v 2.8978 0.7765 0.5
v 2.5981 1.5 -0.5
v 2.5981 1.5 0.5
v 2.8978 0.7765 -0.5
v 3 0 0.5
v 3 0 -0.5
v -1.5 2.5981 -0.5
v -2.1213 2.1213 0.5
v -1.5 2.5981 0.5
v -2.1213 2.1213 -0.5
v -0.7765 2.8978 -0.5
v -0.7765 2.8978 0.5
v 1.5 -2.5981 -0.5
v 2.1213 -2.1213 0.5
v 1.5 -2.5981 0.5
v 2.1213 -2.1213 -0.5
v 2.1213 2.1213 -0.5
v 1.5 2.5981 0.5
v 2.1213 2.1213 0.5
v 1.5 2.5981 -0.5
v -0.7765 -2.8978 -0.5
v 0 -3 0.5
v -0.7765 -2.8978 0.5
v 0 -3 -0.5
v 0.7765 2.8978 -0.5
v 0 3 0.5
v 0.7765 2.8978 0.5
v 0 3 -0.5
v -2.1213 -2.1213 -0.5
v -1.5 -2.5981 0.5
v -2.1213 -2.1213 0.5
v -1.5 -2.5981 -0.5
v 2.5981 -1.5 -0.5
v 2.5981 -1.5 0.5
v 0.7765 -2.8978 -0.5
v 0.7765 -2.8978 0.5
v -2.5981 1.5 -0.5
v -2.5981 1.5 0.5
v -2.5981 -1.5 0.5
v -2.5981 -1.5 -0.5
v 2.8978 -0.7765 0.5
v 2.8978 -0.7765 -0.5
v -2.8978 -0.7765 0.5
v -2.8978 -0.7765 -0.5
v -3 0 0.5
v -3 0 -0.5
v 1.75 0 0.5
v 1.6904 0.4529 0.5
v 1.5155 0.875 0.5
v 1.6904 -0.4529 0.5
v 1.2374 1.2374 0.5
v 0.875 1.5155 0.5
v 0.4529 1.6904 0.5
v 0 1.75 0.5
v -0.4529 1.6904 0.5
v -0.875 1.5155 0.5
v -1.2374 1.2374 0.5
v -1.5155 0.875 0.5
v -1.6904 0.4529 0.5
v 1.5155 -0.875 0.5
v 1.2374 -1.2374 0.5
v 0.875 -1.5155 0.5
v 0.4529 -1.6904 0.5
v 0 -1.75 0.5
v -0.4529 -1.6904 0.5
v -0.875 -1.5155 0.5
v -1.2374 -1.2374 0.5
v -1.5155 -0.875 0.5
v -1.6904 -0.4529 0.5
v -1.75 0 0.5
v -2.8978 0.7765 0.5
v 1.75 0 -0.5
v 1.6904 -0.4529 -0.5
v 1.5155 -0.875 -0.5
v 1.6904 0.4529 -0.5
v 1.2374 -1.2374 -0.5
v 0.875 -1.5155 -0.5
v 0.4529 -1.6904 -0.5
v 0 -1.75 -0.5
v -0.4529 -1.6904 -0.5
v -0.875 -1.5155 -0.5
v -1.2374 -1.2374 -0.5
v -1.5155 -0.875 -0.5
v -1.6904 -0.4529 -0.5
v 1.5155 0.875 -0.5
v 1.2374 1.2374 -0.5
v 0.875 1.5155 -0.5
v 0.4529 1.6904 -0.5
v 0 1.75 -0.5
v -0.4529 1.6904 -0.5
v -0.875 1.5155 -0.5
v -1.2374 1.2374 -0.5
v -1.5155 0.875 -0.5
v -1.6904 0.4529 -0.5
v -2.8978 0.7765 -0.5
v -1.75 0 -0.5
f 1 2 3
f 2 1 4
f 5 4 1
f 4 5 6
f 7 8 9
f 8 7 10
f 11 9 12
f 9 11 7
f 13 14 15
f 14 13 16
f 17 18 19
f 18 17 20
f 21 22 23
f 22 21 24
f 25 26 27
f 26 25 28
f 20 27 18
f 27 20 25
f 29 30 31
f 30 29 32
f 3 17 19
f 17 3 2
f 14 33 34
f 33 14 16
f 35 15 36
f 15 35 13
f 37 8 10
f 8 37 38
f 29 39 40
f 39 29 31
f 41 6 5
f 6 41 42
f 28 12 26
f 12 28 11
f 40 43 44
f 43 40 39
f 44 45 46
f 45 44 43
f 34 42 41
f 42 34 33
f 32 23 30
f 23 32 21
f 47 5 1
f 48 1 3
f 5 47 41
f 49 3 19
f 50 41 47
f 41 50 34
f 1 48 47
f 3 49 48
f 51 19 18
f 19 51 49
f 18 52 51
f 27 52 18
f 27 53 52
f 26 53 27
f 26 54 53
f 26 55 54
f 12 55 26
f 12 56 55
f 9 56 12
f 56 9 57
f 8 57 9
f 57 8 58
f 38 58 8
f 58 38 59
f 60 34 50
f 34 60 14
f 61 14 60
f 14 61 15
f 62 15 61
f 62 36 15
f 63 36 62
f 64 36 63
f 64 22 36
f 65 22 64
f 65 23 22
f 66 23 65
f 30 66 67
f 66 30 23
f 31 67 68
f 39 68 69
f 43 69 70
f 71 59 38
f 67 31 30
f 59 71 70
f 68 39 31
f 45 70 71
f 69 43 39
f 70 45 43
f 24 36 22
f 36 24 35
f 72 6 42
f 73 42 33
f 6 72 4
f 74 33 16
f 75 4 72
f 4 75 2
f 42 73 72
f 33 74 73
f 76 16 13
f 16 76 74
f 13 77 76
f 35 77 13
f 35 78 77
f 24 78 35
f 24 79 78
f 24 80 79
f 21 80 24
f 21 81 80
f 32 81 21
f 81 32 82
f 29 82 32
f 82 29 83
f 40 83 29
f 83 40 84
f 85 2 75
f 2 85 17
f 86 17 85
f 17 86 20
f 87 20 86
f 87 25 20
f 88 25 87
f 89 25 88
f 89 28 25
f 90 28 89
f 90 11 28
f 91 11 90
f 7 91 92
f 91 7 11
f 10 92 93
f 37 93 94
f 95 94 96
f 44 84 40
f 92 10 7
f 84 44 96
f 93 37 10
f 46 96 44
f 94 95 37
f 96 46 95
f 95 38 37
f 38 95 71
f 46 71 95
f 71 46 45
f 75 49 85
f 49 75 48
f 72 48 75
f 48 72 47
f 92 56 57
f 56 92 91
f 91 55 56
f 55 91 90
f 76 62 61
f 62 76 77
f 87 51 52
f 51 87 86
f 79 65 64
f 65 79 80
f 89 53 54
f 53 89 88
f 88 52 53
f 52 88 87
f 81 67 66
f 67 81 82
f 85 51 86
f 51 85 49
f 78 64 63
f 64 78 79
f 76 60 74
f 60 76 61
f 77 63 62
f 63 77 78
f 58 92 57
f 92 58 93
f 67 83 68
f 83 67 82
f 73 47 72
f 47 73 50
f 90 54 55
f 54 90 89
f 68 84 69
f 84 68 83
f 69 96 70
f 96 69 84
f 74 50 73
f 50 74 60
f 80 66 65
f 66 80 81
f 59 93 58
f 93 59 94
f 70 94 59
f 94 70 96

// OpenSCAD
difference()
{
	cylinder(h=1,d=6,center=true,$fn=24);
	cylinder(h=2,d=3.5,center=true,$fn=24);
}
